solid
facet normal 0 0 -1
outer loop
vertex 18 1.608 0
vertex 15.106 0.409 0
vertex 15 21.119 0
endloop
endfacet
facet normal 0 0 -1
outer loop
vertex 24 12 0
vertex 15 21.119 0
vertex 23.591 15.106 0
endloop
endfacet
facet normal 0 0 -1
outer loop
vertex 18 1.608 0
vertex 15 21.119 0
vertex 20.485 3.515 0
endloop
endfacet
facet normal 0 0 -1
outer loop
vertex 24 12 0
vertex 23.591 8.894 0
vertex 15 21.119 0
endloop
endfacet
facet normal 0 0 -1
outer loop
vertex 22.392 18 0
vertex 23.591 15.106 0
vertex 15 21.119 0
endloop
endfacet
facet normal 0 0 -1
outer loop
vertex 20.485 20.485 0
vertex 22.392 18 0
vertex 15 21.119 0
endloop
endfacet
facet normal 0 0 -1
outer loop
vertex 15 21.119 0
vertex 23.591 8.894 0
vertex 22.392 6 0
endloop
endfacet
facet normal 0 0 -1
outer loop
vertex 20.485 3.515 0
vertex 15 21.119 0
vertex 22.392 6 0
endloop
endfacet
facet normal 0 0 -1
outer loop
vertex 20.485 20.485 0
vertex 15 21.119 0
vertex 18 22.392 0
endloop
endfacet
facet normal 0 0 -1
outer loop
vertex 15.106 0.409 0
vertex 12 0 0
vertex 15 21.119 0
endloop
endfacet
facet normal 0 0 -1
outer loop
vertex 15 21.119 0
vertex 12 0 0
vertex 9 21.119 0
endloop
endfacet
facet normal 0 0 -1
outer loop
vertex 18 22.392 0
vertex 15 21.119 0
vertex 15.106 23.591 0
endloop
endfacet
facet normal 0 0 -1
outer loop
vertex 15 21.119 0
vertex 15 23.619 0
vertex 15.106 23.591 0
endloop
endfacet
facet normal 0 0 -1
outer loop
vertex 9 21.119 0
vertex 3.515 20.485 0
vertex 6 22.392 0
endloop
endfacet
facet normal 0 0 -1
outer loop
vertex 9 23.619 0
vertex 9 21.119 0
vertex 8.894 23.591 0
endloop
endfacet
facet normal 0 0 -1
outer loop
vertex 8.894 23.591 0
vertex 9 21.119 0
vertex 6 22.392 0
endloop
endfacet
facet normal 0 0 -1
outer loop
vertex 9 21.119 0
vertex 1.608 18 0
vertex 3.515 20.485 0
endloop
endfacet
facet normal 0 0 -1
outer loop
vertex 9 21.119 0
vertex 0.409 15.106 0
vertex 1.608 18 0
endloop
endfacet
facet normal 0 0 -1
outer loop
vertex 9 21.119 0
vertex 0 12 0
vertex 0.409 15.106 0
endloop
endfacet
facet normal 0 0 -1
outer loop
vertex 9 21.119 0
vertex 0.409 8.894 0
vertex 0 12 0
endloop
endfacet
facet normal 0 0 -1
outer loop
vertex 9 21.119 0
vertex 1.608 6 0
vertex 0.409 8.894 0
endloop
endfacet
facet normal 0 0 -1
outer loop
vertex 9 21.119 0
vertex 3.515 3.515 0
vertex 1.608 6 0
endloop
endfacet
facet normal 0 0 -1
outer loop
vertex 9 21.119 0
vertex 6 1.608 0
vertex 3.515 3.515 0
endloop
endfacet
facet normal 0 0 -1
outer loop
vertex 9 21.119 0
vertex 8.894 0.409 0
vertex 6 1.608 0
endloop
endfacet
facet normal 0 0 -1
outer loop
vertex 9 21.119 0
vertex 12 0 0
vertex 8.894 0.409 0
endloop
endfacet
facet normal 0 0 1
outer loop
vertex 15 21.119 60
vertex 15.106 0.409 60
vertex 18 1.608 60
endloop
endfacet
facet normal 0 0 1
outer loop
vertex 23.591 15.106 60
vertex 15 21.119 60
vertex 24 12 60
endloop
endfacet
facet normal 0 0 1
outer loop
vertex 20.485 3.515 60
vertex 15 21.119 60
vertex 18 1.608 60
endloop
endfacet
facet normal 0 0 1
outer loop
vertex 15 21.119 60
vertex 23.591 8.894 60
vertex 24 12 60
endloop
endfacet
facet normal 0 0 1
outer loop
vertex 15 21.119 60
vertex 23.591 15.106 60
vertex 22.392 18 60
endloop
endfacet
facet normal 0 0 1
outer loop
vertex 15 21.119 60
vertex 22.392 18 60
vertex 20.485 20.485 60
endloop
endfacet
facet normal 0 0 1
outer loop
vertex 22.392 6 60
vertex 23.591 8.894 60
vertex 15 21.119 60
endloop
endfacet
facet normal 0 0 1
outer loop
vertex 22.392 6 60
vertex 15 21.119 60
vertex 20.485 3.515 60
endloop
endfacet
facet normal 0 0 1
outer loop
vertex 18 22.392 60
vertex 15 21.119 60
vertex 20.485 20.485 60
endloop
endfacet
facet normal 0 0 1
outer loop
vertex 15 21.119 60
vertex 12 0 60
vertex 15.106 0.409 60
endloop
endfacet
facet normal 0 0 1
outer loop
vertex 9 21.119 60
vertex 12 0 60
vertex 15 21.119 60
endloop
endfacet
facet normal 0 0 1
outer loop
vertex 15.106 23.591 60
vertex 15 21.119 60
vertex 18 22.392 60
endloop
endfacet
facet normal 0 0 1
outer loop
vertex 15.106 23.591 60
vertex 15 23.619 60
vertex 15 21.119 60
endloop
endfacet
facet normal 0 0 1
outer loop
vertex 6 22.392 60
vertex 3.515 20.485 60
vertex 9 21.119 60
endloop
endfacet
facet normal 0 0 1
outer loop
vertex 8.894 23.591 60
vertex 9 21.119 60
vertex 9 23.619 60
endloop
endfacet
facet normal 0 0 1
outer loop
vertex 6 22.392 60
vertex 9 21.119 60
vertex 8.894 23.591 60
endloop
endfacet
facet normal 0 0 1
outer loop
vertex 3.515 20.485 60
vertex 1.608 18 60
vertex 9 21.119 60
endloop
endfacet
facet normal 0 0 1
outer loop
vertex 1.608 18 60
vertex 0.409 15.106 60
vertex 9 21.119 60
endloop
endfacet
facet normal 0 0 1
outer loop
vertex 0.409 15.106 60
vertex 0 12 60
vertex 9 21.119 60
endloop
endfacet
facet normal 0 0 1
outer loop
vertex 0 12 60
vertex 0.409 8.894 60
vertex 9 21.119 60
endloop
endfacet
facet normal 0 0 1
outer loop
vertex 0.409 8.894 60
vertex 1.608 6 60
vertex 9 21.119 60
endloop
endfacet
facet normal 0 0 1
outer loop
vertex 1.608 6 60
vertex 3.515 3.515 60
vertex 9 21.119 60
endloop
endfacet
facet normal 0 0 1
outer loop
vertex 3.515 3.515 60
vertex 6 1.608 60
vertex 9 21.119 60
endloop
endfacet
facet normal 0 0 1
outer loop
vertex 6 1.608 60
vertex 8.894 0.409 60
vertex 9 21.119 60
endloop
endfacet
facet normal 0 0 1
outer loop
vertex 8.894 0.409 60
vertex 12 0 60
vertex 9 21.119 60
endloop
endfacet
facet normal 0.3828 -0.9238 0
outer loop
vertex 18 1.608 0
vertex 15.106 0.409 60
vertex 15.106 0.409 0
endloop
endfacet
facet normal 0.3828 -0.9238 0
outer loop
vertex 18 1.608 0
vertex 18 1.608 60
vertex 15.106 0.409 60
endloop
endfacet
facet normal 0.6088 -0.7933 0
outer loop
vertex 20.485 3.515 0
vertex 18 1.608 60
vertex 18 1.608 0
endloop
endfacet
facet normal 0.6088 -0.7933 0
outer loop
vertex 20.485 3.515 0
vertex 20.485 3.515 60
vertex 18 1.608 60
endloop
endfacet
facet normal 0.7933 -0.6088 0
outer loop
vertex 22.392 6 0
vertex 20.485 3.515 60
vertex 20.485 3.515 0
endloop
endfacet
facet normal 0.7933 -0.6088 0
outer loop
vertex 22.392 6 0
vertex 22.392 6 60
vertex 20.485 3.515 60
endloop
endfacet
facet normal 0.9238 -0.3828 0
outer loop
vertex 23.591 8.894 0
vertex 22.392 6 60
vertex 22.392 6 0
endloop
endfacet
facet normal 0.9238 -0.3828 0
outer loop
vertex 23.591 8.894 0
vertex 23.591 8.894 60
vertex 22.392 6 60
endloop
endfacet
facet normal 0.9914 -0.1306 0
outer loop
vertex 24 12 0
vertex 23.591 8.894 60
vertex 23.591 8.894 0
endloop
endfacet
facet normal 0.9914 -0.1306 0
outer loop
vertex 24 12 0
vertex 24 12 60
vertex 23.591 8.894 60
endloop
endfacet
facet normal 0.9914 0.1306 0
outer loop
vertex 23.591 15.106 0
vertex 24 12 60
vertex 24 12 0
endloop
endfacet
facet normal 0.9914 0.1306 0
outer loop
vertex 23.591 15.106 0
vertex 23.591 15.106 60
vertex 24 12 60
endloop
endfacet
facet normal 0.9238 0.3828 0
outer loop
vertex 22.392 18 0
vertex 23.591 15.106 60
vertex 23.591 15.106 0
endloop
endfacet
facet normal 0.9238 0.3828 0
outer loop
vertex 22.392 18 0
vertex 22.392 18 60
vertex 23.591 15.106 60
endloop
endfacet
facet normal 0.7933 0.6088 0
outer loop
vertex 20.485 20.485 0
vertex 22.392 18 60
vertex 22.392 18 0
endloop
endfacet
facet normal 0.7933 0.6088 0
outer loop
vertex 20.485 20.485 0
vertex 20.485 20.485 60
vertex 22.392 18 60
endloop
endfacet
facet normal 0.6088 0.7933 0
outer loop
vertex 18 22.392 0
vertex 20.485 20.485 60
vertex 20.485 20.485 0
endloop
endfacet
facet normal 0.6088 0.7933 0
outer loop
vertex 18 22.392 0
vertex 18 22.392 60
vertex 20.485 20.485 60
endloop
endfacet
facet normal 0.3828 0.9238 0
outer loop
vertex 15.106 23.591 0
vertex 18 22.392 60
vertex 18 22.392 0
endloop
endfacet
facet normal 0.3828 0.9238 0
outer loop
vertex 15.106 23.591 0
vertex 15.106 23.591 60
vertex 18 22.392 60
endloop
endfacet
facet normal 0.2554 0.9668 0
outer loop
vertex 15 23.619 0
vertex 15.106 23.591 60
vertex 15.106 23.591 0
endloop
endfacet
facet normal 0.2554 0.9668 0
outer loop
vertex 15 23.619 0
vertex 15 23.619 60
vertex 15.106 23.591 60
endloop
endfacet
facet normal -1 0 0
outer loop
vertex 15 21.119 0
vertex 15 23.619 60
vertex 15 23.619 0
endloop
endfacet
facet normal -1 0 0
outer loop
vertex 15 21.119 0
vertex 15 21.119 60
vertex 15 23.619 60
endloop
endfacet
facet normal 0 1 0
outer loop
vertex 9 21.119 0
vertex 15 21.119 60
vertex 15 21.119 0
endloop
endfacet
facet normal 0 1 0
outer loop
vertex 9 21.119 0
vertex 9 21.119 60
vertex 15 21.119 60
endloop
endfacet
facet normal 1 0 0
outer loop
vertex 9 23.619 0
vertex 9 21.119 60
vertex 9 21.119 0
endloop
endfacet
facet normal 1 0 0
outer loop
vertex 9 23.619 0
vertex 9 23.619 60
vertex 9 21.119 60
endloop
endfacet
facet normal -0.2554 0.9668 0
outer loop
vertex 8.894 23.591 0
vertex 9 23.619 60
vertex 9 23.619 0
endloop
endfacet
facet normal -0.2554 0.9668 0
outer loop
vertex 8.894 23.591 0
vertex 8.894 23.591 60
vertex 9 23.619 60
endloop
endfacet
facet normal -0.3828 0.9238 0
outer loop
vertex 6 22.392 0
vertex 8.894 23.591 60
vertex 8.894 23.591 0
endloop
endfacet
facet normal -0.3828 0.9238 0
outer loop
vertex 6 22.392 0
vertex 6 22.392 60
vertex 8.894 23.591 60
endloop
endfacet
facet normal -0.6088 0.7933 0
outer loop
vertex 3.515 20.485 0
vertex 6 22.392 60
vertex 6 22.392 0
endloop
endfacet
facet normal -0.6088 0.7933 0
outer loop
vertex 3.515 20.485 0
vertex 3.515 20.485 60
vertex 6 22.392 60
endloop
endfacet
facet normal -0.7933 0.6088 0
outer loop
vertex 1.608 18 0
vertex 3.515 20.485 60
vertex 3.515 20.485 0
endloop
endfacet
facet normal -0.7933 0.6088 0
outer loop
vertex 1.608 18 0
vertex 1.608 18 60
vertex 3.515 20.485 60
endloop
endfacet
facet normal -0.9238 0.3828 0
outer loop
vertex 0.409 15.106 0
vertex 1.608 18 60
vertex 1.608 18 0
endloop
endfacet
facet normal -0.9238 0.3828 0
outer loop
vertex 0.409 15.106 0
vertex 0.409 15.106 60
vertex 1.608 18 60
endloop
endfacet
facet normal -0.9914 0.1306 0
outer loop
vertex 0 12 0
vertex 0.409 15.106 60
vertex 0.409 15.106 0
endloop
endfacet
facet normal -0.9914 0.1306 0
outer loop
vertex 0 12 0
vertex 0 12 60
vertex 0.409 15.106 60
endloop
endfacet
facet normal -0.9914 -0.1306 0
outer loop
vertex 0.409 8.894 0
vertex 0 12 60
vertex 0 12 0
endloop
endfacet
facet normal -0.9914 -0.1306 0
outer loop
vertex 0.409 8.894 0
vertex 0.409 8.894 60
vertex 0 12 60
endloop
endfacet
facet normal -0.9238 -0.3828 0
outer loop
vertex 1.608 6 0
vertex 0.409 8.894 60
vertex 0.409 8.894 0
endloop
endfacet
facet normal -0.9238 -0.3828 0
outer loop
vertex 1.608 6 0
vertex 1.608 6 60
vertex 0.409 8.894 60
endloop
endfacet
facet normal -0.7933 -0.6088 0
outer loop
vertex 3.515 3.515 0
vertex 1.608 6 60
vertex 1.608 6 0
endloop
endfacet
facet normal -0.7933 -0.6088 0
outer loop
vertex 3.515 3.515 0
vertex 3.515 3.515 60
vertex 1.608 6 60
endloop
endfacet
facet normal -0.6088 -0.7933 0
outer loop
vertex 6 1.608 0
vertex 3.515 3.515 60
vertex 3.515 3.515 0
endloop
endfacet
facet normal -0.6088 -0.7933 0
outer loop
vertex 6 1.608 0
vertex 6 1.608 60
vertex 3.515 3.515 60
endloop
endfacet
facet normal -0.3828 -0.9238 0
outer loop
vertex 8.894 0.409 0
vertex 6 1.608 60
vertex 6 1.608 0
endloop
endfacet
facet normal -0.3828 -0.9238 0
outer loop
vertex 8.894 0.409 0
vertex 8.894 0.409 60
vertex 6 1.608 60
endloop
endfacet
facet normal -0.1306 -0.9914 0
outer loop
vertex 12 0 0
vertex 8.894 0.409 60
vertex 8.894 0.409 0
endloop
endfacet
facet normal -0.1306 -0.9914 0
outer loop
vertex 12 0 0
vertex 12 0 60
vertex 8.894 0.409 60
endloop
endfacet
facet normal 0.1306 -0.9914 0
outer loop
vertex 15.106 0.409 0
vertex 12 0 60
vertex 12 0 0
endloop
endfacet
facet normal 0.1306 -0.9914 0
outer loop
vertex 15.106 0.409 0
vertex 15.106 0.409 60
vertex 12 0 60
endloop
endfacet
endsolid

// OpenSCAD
$fn = 32;

// ----------------------------------------------------------------------
// Keyway shaft: d24 shaft, key 6 x 2.5 mm
// ----------------------------------------------------------------------

// --- parameters (mm) ---
shaft_r = 12;             // shaft radius
key_w = 6;                // keyway width
key_d = 2.5;              // keyway depth below the surface line
plate_t = 60;             // shaft length, Z (extrusion height)

shaft_d = 2 * shaft_r;  // shaft diameter
circle_step = 15;  // polygon sampling step, degrees

profile = [[8.894, 23.591], [6, 22.392], [3.515, 20.485], [1.608, 18], [0.409, 15.106], [0, 12], [0.409, 8.894], [1.608, 6], [3.515, 3.515], [6, 1.608], [8.894, 0.409], [12, 0], [15.106, 0.409], [18, 1.608], [20.485, 3.515], [22.392, 6], [23.591, 8.894], [24, 12], [23.591, 15.106], [22.392, 18], [20.485, 20.485], [18, 22.392], [15.106, 23.591], [15, 23.619], [15, 21.119], [9, 21.119], [9, 23.619]];  // primary outline, 27 points, counter clockwise

// --- the one profile operation ---
linear_extrude(height = plate_t) polygon(points = profile);
